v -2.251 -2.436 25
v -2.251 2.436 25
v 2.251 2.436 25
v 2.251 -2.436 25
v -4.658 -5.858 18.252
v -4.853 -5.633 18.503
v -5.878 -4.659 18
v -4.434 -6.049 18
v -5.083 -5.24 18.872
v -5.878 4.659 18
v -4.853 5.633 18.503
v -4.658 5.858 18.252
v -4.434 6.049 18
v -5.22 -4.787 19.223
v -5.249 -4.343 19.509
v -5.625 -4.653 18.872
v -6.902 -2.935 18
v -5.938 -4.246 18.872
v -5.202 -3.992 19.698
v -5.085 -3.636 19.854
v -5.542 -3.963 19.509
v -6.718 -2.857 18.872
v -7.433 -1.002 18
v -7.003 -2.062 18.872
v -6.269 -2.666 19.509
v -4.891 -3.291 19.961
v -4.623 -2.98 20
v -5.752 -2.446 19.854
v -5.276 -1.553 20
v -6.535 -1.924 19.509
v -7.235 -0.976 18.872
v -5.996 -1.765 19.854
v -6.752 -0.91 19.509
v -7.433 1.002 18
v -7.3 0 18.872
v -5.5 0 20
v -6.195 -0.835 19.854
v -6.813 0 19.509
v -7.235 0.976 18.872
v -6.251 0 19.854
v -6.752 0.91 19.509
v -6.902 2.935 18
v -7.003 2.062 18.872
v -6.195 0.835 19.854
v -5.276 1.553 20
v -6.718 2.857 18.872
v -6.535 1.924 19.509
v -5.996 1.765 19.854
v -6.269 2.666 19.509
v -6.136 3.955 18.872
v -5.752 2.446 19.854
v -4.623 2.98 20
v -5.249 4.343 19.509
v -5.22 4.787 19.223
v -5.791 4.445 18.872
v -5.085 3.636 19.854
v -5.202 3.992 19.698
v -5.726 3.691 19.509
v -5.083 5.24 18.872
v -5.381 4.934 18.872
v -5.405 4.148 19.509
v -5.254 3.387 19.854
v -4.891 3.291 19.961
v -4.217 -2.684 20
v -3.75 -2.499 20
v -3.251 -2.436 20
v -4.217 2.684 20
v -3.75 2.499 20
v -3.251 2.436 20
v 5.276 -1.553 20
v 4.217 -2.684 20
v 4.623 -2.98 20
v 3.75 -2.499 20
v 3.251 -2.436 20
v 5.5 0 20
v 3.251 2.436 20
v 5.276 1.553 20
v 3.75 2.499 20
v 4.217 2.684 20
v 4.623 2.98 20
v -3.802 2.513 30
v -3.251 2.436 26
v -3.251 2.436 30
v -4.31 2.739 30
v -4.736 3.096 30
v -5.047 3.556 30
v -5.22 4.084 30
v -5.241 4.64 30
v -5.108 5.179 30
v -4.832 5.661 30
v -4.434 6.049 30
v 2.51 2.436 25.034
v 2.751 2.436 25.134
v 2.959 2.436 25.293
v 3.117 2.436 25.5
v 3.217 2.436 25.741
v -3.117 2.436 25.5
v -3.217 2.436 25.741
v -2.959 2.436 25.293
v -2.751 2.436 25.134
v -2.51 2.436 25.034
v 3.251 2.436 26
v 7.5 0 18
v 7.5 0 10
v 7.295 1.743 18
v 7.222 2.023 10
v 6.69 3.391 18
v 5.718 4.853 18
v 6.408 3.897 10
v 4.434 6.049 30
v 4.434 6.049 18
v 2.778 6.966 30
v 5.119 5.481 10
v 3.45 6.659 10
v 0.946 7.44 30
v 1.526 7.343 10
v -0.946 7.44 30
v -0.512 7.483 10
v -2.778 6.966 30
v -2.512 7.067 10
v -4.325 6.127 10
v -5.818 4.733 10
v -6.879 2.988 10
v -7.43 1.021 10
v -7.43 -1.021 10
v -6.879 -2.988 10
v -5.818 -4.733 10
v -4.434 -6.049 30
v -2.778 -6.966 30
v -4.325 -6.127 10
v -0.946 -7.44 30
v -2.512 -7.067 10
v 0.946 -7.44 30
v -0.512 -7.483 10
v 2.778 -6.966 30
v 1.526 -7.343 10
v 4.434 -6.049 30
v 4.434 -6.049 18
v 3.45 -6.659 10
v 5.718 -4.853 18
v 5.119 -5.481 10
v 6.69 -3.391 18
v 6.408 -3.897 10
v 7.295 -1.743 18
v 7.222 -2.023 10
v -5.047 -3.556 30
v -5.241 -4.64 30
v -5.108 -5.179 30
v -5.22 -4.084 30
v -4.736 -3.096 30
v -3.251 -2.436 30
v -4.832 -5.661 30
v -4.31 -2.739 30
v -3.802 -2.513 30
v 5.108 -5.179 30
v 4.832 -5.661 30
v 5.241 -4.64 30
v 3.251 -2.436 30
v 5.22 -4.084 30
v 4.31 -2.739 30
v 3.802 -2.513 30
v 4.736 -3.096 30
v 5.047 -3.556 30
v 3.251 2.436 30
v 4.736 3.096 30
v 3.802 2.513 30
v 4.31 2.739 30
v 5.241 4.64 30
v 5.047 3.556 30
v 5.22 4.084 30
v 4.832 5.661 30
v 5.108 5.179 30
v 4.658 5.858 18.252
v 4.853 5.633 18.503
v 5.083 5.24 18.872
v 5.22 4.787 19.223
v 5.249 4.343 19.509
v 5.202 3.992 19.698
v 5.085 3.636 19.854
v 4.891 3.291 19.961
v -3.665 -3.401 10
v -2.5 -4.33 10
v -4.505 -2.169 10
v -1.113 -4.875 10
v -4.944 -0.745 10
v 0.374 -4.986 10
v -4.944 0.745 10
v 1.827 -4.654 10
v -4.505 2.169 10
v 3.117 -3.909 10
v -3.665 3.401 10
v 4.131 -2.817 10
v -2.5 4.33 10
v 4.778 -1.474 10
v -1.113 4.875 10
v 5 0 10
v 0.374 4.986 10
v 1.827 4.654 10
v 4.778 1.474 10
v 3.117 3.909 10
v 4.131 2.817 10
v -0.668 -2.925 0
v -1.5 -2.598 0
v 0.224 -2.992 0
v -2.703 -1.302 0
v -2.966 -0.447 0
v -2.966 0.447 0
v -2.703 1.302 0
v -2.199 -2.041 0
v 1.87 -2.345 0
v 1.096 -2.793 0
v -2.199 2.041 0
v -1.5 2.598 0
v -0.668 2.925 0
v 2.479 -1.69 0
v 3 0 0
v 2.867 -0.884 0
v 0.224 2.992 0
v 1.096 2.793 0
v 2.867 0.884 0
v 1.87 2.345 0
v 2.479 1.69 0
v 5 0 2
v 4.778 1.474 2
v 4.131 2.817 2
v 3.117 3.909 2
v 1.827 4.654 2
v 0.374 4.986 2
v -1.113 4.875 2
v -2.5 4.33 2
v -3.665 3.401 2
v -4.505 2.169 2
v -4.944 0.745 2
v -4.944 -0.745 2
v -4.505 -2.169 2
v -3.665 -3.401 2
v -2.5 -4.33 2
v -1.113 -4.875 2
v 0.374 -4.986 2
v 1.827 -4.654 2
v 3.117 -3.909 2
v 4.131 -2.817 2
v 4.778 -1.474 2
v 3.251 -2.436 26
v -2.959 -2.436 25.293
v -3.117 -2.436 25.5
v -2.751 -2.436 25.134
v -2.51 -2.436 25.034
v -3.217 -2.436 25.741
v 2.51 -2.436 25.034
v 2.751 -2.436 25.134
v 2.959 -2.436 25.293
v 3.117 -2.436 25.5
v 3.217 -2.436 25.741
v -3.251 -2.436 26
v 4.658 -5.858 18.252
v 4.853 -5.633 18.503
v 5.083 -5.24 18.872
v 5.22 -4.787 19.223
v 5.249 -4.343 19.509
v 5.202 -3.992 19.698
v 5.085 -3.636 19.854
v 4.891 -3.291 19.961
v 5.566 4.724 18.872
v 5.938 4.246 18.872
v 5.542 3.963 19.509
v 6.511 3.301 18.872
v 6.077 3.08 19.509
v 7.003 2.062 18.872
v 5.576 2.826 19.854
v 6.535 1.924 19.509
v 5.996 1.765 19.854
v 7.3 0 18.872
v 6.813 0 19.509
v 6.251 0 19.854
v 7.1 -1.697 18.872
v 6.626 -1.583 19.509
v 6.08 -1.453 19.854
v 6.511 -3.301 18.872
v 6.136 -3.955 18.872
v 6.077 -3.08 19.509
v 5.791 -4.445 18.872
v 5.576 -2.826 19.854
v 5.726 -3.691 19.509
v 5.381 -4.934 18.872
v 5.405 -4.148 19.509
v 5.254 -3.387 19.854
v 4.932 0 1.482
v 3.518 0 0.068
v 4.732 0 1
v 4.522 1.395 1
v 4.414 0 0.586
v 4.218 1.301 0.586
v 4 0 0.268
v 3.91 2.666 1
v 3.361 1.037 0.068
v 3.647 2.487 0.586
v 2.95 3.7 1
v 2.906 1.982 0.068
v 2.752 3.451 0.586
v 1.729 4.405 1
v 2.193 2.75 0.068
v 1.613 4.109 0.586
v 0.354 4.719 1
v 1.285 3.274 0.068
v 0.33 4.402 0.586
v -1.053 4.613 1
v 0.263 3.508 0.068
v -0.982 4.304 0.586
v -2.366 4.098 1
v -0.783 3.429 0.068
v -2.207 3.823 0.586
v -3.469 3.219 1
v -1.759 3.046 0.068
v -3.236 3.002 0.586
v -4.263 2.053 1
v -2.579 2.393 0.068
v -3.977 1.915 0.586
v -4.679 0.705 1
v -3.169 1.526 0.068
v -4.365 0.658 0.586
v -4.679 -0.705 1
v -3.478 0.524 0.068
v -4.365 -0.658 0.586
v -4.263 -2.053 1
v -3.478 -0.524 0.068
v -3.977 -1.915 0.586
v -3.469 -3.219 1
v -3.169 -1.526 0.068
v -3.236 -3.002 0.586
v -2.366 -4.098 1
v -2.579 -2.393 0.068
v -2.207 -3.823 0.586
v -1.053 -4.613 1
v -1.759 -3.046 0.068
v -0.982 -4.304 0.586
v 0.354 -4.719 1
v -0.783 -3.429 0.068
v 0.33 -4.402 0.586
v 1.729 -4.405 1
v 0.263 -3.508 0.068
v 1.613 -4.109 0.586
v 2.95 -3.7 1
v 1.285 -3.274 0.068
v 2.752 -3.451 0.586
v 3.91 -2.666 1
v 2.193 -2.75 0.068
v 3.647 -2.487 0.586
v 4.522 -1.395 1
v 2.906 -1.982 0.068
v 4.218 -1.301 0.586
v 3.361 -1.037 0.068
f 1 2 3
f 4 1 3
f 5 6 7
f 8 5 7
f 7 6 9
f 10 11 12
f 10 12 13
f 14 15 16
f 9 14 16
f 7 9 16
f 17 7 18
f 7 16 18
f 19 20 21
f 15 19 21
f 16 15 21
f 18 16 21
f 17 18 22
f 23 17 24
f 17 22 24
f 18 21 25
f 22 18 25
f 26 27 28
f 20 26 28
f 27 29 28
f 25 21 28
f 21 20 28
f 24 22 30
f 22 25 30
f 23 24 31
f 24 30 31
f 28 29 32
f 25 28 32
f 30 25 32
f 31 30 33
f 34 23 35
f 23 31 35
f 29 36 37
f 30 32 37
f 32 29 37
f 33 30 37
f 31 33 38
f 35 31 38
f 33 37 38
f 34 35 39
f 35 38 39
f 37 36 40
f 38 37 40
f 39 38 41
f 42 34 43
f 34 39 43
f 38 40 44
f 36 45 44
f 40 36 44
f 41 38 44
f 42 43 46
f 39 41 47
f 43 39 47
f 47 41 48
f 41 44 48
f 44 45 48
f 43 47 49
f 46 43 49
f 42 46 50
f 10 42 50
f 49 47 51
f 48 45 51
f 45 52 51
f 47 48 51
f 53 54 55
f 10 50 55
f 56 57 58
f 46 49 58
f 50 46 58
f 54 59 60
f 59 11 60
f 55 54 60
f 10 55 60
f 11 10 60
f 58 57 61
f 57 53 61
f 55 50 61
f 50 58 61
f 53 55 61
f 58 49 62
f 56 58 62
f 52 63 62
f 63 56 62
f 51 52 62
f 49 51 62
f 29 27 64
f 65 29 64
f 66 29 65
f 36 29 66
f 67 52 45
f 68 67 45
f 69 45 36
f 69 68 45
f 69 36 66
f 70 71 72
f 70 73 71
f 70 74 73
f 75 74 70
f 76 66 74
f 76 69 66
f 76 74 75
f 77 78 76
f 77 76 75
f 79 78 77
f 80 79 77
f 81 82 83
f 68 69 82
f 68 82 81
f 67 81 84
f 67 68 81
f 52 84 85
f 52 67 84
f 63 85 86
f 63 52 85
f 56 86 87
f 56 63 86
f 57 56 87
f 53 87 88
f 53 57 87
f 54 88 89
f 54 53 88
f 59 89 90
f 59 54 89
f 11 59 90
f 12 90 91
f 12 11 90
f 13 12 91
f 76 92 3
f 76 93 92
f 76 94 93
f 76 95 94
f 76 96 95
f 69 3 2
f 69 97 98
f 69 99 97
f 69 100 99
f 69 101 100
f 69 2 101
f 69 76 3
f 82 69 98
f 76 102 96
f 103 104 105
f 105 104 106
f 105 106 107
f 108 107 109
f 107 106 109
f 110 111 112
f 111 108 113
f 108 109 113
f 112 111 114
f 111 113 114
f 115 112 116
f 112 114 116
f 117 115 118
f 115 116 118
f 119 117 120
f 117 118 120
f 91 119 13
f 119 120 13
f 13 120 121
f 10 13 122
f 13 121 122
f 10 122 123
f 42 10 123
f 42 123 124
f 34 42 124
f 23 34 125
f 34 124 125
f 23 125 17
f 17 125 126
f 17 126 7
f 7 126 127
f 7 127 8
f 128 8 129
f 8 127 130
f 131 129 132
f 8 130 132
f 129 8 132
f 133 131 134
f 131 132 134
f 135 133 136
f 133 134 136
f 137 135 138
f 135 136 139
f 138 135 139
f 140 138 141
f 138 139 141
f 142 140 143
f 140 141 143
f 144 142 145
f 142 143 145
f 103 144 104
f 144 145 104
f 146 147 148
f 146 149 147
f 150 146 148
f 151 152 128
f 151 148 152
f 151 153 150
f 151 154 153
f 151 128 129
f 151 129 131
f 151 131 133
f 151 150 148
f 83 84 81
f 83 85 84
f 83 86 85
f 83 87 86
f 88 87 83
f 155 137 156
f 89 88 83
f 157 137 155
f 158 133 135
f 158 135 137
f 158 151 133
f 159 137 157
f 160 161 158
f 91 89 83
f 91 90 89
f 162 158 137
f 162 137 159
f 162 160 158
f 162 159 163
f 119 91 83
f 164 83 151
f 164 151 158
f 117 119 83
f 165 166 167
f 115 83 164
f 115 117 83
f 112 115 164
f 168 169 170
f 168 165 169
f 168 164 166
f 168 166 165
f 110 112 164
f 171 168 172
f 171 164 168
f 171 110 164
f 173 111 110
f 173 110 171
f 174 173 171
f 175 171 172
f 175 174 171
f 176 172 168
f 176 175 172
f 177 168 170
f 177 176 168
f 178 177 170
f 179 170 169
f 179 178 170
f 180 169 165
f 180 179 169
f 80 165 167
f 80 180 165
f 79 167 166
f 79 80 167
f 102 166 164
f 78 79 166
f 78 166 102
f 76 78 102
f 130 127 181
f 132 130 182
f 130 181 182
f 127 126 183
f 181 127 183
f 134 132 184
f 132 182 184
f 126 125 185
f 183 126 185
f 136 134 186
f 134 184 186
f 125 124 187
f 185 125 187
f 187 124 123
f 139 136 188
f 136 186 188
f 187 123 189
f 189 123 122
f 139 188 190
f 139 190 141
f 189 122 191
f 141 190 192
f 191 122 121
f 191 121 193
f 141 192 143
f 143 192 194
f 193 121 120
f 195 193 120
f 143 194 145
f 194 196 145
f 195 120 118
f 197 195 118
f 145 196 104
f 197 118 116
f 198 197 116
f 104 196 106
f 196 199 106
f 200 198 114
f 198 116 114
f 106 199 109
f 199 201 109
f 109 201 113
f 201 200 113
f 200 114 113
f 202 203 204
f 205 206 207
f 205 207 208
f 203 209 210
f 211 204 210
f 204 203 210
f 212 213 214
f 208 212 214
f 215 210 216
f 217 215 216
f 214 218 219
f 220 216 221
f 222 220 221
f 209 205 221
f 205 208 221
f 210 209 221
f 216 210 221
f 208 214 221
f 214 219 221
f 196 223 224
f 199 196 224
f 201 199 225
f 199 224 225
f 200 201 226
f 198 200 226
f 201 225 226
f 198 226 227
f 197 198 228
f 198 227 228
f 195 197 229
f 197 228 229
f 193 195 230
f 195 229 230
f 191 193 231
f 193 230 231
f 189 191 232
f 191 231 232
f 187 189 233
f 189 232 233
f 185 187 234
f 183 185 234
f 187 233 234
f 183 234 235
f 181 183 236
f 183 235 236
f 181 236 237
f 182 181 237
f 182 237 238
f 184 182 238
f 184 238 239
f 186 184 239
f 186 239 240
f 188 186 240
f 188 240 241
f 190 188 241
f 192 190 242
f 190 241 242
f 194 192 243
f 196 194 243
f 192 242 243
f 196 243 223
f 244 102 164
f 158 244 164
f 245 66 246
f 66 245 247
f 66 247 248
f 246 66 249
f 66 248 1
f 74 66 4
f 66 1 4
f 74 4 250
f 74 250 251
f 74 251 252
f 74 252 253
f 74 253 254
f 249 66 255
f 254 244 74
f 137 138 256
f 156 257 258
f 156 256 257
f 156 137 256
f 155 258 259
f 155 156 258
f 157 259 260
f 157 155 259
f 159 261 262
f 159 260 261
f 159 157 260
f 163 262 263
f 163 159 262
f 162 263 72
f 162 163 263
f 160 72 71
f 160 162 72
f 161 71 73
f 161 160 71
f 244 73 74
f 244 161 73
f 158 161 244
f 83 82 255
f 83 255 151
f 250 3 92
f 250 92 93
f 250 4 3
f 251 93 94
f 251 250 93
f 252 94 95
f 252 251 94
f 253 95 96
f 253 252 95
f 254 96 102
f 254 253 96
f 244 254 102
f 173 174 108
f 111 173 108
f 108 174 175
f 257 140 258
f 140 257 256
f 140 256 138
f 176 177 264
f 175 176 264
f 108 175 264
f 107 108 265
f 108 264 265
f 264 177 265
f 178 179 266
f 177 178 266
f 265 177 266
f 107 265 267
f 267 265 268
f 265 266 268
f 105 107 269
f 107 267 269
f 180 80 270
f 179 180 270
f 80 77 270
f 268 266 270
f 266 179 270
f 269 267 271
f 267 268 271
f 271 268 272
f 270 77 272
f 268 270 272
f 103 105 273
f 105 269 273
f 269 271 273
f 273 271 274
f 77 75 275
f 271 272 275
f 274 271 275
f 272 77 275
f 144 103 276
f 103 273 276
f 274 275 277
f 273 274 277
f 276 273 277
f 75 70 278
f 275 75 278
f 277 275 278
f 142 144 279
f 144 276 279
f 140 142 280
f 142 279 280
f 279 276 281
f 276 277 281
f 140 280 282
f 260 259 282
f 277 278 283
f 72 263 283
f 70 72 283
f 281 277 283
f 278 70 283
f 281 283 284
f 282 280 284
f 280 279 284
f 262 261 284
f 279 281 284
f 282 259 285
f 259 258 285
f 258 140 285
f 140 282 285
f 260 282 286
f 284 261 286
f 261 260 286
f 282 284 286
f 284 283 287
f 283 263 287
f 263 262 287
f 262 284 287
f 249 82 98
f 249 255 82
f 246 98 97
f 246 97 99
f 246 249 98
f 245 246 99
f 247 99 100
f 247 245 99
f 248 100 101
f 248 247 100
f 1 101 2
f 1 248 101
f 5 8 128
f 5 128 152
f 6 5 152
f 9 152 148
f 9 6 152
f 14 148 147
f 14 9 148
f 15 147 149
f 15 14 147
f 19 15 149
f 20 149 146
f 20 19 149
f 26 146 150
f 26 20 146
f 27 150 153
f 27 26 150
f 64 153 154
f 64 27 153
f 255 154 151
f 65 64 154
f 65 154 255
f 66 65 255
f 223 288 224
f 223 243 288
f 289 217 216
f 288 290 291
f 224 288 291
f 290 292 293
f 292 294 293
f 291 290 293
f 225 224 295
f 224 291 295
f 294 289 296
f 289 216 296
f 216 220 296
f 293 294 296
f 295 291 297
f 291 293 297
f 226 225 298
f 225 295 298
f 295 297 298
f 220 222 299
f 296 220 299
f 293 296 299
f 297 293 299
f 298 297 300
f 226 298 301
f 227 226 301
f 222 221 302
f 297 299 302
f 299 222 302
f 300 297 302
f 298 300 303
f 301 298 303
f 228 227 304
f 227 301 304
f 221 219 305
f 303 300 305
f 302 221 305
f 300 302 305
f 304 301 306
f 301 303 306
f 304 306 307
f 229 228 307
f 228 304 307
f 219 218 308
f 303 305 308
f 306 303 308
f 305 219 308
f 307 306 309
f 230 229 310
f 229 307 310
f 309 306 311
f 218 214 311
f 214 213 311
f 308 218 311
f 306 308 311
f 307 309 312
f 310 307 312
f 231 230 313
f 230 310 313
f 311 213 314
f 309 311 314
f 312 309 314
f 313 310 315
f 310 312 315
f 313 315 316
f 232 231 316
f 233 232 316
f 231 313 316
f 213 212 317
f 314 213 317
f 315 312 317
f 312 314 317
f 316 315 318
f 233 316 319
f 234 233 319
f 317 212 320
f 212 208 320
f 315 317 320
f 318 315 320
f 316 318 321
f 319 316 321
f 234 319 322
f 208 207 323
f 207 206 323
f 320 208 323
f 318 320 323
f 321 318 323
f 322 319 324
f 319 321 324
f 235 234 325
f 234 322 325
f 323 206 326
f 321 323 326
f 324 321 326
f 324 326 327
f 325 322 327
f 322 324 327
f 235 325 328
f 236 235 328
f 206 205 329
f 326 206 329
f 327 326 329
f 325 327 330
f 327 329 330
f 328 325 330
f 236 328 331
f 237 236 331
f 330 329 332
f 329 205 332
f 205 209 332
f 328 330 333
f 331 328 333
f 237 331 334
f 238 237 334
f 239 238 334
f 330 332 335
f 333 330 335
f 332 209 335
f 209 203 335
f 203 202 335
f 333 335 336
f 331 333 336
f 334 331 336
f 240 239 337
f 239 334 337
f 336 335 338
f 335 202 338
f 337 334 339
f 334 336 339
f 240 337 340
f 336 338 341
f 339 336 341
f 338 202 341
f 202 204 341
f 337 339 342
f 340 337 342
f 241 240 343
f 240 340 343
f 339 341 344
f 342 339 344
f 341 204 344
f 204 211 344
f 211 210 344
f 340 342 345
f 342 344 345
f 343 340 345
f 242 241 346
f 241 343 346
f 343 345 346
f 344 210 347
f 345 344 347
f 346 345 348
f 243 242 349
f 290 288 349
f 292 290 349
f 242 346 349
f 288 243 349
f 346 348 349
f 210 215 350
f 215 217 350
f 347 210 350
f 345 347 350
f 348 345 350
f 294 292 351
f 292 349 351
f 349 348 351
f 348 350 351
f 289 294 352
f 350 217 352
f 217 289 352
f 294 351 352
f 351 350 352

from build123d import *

# Parameters (mm, degrees)
F0_R         = 5
F1_DEPTH     = 10
F2_R         = 7.5
F2_R_2       = 5
F3_DEPTH     = 15
F5_DEPTH     = 5
F6_T1_DEPTH  = 16.216012475
F6_T6_ANGLE  = 57.151354628
F6_T11_ANGLE = 114.30679143
F6_T17_ANGLE = 57.151354628
F6_T23_ANGLE = 57.151354628
F6_T27_DEPTH = 27.4320249501
F6_T34_DEPTH = 27.4320249501
F6_T38_ANGLE = 114.30679143
F6_T45_ANGLE = 114.30679143
F6_T49_DEPTH = 27.4320249501
F6_T56_DEPTH = 27.4320249501
F6_T60_ANGLE = 57.151354628
F7_R         = 2
F8_DEPTH     = 5
F9_W         = 6.5028829414
F9_H         = 5
F10_DEPTH    = 6
F11_R        = 1


# Not quite as in the source:
# - a fillet or chamfer that OpenCascade refuses, or shapes differently, is made with other operations: its cross-section is extruded or revolved along the edge and cut away or added


with BuildPart() as f1:
    # F0 (on Top) → F1 (new body)
    with BuildSketch(Plane.XY):
        Circle(F0_R)
    extrude(amount=F1_DEPTH)

    # F2 (on face) → F3 (join)
    with BuildSketch(Plane.XY.offset(10)):
        Circle(F2_R)
        Circle(F2_R_2, mode=Mode.SUBTRACT)
        Circle(F2_R_2)
    extrude(amount=F3_DEPTH)

    # F4 (on face) → F5 (cut)
    with BuildSketch(Plane.XY.offset(25)):
        with BuildLine():
            Line((-10.1172067225, -2.4360036477), (-7.0933691733, -2.4360036477))
            ThreePointArc((-7.0933691733, -2.4360036477), (-7.5, 0), (-7.0933691733, 2.4360036477))
            Line((-7.0933691733, 2.4360036477), (-10.1172067225, 2.4360036477))
            Line((-10.1172067225, 2.4360036477), (-10.1172067225, -2.4360036477))
        make_face()
        with BuildLine():
            Line((-7.0933691733, -2.4360036477), (7.0933691733, -2.4360036477))
            ThreePointArc((7.0933691733, -2.4360036477), (7.3976438411, -1.2348544855), (7.5, 0))
            ThreePointArc((7.5, 0), (7.3976438411, 1.2348544855), (7.0933691733, 2.4360036477))
            Line((7.0933691733, 2.4360036477), (-7.0933691733, 2.4360036477))
            ThreePointArc((-7.0933691733, 2.4360036477), (-7.5, 0), (-7.0933691733, -2.4360036477))
        make_face()
        with BuildLine():
            Line((7.0933691733, -2.4360036477), (10.1172067225, -2.4360036477))
            Line((10.1172067225, -2.4360036477), (10.1172067225, 2.4360036477))
            Line((10.1172067225, 2.4360036477), (7.0933691733, 2.4360036477))
            ThreePointArc((7.0933691733, 2.4360036477), (7.3976438411, 1.2348544855), (7.5, 0))
            ThreePointArc((7.5, 0), (7.3976438411, -1.2348544855), (7.0933691733, -2.4360036477))
        make_face()
    extrude(amount=-F5_DEPTH, mode=Mode.SUBTRACT)

    # F6: fillet of radius 2 on 7 edges, made by hand

    # F6_s2 → F6_t1 (cut)
    with BuildSketch(Plane.XY.offset(20)):
        with BuildLine():
            ThreePointArc((-4.4337838236, 6.0490958833), (-5.1522550427, 3.8139845448), (-3.2514414707, 2.4360036477))
            Line((-3.2514414707, 2.4360036477), (-7.0933691733, 2.4360036477))
            ThreePointArc((-7.0933691733, 2.4360036477), (-6.0400681229, 4.4460743438), (-4.4337838236, 6.0490958833))
        make_face()
        with BuildLine():
            ThreePointArc((4.4337838236, 6.0490958833), (5.1522550427, 3.8139845448), (3.2514414707, 2.4360036477))
            Line((3.2514414707, 2.4360036477), (7.0933691733, 2.4360036477))
            ThreePointArc((7.0933691733, 2.4360036477), (6.0400681229, 4.4460743438), (4.4337838236, 6.0490958833))
        make_face()
        with BuildLine():
            ThreePointArc((4.4337838236, -6.0490958833), (5.1522550427, -3.8139845448), (3.2514414707, -2.4360036477))
            Line((3.2514414707, -2.4360036477), (7.0933691733, -2.4360036477))
            ThreePointArc((7.0933691733, -2.4360036477), (6.0400681229, -4.4460743438), (4.4337838236, -6.0490958833))
        make_face()
        with BuildLine():
            ThreePointArc((-4.4337838236, -6.0490958833), (-5.1522550427, -3.8139845448), (-3.2514414707, -2.4360036477))
            Line((-3.2514414707, -2.4360036477), (-7.0933691733, -2.4360036477))
            ThreePointArc((-7.0933691733, -2.4360036477), (-6.0400681229, -4.4460743438), (-4.4337838236, -6.0490958833))
        make_face()
    extrude(amount=F6_T1_DEPTH, mode=Mode.SUBTRACT)


with BuildPart() as f6_tool4:
    # F6_s5 → F6_t6 (revolve)
    with BuildSketch(Plane.XZ):
        with BuildLine():
            ThreePointArc((7.5, 18), (6.9142135624, 19.4142135624), (5.5, 20))
            Line((5.5, 20), (7.5, 20))
            Line((7.5, 20), (7.5, 18))
        make_face()
    revolve(axis=Axis((0, 0, 20), (0, 0, -1)), revolution_arc=F6_T6_ANGLE)

    split(bisect_by=Plane.XZ.offset(2.4360036477), keep=Keep.BOTTOM)


with BuildPart() as f1_1:
    add(f1.part)

    # F6_t3: cut F6_tool4
    add(f6_tool4.part, mode=Mode.SUBTRACT)


with BuildPart() as f6_tool9:
    # F6_s10 → F6_t11 (revolve)
    with BuildSketch(Plane(origin=(0, 0, 0), x_dir=(0, 0, 1), z_dir=(0.840125701, -0.5423917464, 0))):
        with BuildLine():
            ThreePointArc((18, 7.5), (19.4142135624, 6.9142135624), (20, 5.5))
            Line((20, 5.5), (20, 7.5))
            Line((20, 7.5), (18, 7.5))
        make_face()
    revolve(axis=Axis((0, 0, 20), (0, 0, -1)), revolution_arc=F6_T11_ANGLE)

    split(bisect_by=Plane.XZ.offset(-2.4360036477), keep=Keep.TOP)

    split(bisect_by=Plane.XZ.offset(2.4360036477), keep=Keep.BOTTOM)


with BuildPart() as f1_2:
    add(f1_1.part)

    # F6_t8: cut F6_tool9
    add(f6_tool9.part, mode=Mode.SUBTRACT)


with BuildPart() as f6_tool15:
    # F6_s16 → F6_t17 (revolve)
    with BuildSketch(Plane(origin=(0, 0, 0), x_dir=(0, 0, 1), z_dir=(-0.8401063785, 0.5424216744, 0))):
        with BuildLine():
            ThreePointArc((18, 7.5), (19.4142135624, 6.9142135624), (20, 5.5))
            Line((20, 5.5), (20, 7.5))
            Line((20, 7.5), (18, 7.5))
        make_face()
    revolve(axis=Axis((0, 0, 20), (0, 0, -1)), revolution_arc=F6_T17_ANGLE)

    split(bisect_by=Plane.XZ.offset(-2.4360036477), keep=Keep.TOP)


with BuildPart() as f1_3:
    add(f1_2.part)

    # F6_t14: cut F6_tool15
    add(f6_tool15.part, mode=Mode.SUBTRACT)


with BuildPart() as f6_tool21:
    # F6_s22 → F6_t23 (revolve)
    with BuildSketch(Plane.XZ):
        with BuildLine():
            ThreePointArc((7.5, 18), (6.9142135624, 19.4142135624), (5.5, 20))
            Line((5.5, 20), (7.5, 20))
            Line((7.5, 20), (7.5, 18))
        make_face()
    revolve(axis=Axis((0, 0, 20), (0, 0, -1)), revolution_arc=F6_T23_ANGLE)

    split(bisect_by=Plane.XZ.offset(2.4360036477), keep=Keep.TOP)


with BuildPart() as f6_tool25:
    # F6_s26 → F6_t27 (new body)
    with BuildSketch(Plane.XY.offset(36.216012475)):
        with BuildLine():
            ThreePointArc((4.4337838236, -6.0490958833), (5.1522550427, -3.8139845448), (3.2514414707, -2.4360036477))
            Line((3.2514414707, -2.4360036477), (7.0933691733, -2.4360036477))
            ThreePointArc((7.0933691733, -2.4360036477), (6.0400681229, -4.4460743438), (4.4337838236, -6.0490958833))
        make_face()
    extrude(amount=-F6_T27_DEPTH)

    split(bisect_by=Plane.XY.offset(20), keep=Keep.BOTTOM)


with BuildPart() as f6_tool21_1:
    add(f6_tool21.part)

    # F6_t29: intersect F6_tool25
    add(f6_tool25.part, mode=Mode.INTERSECT)


with BuildPart() as f1_4:
    add(f1_3.part)

    # F6_t19: cut F6_tool21
    add(f6_tool21_1.part, mode=Mode.SUBTRACT)


with BuildPart() as f6_tool32:
    # F6_s33 → F6_t34 (new body)
    with BuildSketch(Plane.XY.offset(36.216012475)):
        with BuildLine():
            ThreePointArc((-4.4337838236, -6.0490958833), (-5.1522550427, -3.8139845448), (-3.2514414707, -2.4360036477))
            Line((-3.2514414707, -2.4360036477), (-7.0933691733, -2.4360036477))
            ThreePointArc((-7.0933691733, -2.4360036477), (-6.0400681229, -4.4460743438), (-4.4337838236, -6.0490958833))
        make_face()
    extrude(amount=-F6_T34_DEPTH)

    split(bisect_by=Plane.XY.offset(20), keep=Keep.BOTTOM)


with BuildPart() as f6_tool36:
    # F6_s37 → F6_t38 (revolve)
    with BuildSketch(Plane(origin=(0, 0, 0), x_dir=(0, 0, 1), z_dir=(0.840125701, -0.5423917464, 0))):
        with BuildLine():
            ThreePointArc((18, 7.5), (19.4142135624, 6.9142135624), (20, 5.5))
            Line((20, 5.5), (20, 7.5))
            Line((20, 7.5), (18, 7.5))
        make_face()
    revolve(axis=Axis((0, 0, 20), (0, 0, -1)), revolution_arc=F6_T38_ANGLE)

    split(bisect_by=Plane.XZ.offset(2.4360036477), keep=Keep.TOP)


with BuildPart() as f6_tool32_1:
    add(f6_tool32.part)

    # F6_t40: intersect F6_tool36
    add(f6_tool36.part, mode=Mode.INTERSECT)


with BuildPart() as f1_5:
    add(f1_4.part)

    # F6_t30: cut F6_tool32
    add(f6_tool32_1.part, mode=Mode.SUBTRACT)


with BuildPart() as f6_tool43:
    # F6_s44 → F6_t45 (revolve)
    with BuildSketch(Plane(origin=(0, 0, 0), x_dir=(0, 0, 1), z_dir=(0.840125701, -0.5423917464, 0))):
        with BuildLine():
            ThreePointArc((18, 7.5), (19.4142135624, 6.9142135624), (20, 5.5))
            Line((20, 5.5), (20, 7.5))
            Line((20, 7.5), (18, 7.5))
        make_face()
    revolve(axis=Axis((0, 0, 20), (0, 0, -1)), revolution_arc=F6_T45_ANGLE)

    split(bisect_by=Plane.XZ.offset(-2.4360036477), keep=Keep.BOTTOM)


with BuildPart() as f6_tool47:
    # F6_s48 → F6_t49 (new body)
    with BuildSketch(Plane.XY.offset(36.216012475)):
        with BuildLine():
            ThreePointArc((-4.4337838236, 6.0490958833), (-5.1522550427, 3.8139845448), (-3.2514414707, 2.4360036477))
            Line((-3.2514414707, 2.4360036477), (-7.0933691733, 2.4360036477))
            ThreePointArc((-7.0933691733, 2.4360036477), (-6.0400681229, 4.4460743438), (-4.4337838236, 6.0490958833))
        make_face()
    extrude(amount=-F6_T49_DEPTH)

    split(bisect_by=Plane.XY.offset(20), keep=Keep.BOTTOM)


with BuildPart() as f6_tool43_1:
    add(f6_tool43.part)

    # F6_t51: intersect F6_tool47
    add(f6_tool47.part, mode=Mode.INTERSECT)


with BuildPart() as f1_6:
    add(f1_5.part)

    # F6_t41: cut F6_tool43
    add(f6_tool43_1.part, mode=Mode.SUBTRACT)


with BuildPart() as f6_tool54:
    # F6_s55 → F6_t56 (new body)
    with BuildSketch(Plane.XY.offset(36.216012475)):
        with BuildLine():
            ThreePointArc((4.4337838236, 6.0490958833), (5.1522550427, 3.8139845448), (3.2514414707, 2.4360036477))
            Line((3.2514414707, 2.4360036477), (7.0933691733, 2.4360036477))
            ThreePointArc((7.0933691733, 2.4360036477), (6.0400681229, 4.4460743438), (4.4337838236, 6.0490958833))
        make_face()
    extrude(amount=-F6_T56_DEPTH)

    split(bisect_by=Plane.XY.offset(20), keep=Keep.BOTTOM)


with BuildPart() as f6_tool58:
    # F6_s59 → F6_t60 (revolve)
    with BuildSketch(Plane(origin=(0, 0, 0), x_dir=(0, 0, 1), z_dir=(-0.8401063785, 0.5424216744, 0))):
        with BuildLine():
            ThreePointArc((18, 7.5), (19.4142135624, 6.9142135624), (20, 5.5))
            Line((20, 5.5), (20, 7.5))
            Line((20, 7.5), (18, 7.5))
        make_face()
    revolve(axis=Axis((0, 0, 20), (0, 0, -1)), revolution_arc=F6_T60_ANGLE)

    split(bisect_by=Plane.XZ.offset(-2.4360036477), keep=Keep.BOTTOM)


with BuildPart() as f6_tool54_1:
    add(f6_tool54.part)

    # F6_t62: intersect F6_tool58
    add(f6_tool58.part, mode=Mode.INTERSECT)


with BuildPart() as f1_7:
    add(f1_6.part)

    # F6_t52: cut F6_tool54
    add(f6_tool54_1.part, mode=Mode.SUBTRACT)

    # F7
    f7_edges = [f1_7.edges().sort_by_distance(p)[0] for p in [
        (-5, 0, 0),
    ]]
    fillet(f7_edges, radius=F7_R)

    # F8 (add): faces of the model
    f8_faces = [f1_7.faces().sort_by_distance(p)[0] for p in [
        (0, 4.7439045523, 25),
        (0, -4.7439045523, 25),
    ]]
    extrude(f8_faces, amount=F8_DEPTH)

    # F9 (on face) → F10 (join)
    with BuildSketch(Plane.XZ.offset(-2.4360036477)):
        with Locations((0, 27.5)):
            Rectangle(F9_W, F9_H)
    extrude(amount=F10_DEPTH)

    # F11
    f11_edges = [f1_7.edges().sort_by_distance(p)[0] for p in [
        (3.251441, 0, 25),
        (-3.251441, 0, 25),
    ]]
    fillet(f11_edges, radius=F11_R)


solid = f1_7.part
